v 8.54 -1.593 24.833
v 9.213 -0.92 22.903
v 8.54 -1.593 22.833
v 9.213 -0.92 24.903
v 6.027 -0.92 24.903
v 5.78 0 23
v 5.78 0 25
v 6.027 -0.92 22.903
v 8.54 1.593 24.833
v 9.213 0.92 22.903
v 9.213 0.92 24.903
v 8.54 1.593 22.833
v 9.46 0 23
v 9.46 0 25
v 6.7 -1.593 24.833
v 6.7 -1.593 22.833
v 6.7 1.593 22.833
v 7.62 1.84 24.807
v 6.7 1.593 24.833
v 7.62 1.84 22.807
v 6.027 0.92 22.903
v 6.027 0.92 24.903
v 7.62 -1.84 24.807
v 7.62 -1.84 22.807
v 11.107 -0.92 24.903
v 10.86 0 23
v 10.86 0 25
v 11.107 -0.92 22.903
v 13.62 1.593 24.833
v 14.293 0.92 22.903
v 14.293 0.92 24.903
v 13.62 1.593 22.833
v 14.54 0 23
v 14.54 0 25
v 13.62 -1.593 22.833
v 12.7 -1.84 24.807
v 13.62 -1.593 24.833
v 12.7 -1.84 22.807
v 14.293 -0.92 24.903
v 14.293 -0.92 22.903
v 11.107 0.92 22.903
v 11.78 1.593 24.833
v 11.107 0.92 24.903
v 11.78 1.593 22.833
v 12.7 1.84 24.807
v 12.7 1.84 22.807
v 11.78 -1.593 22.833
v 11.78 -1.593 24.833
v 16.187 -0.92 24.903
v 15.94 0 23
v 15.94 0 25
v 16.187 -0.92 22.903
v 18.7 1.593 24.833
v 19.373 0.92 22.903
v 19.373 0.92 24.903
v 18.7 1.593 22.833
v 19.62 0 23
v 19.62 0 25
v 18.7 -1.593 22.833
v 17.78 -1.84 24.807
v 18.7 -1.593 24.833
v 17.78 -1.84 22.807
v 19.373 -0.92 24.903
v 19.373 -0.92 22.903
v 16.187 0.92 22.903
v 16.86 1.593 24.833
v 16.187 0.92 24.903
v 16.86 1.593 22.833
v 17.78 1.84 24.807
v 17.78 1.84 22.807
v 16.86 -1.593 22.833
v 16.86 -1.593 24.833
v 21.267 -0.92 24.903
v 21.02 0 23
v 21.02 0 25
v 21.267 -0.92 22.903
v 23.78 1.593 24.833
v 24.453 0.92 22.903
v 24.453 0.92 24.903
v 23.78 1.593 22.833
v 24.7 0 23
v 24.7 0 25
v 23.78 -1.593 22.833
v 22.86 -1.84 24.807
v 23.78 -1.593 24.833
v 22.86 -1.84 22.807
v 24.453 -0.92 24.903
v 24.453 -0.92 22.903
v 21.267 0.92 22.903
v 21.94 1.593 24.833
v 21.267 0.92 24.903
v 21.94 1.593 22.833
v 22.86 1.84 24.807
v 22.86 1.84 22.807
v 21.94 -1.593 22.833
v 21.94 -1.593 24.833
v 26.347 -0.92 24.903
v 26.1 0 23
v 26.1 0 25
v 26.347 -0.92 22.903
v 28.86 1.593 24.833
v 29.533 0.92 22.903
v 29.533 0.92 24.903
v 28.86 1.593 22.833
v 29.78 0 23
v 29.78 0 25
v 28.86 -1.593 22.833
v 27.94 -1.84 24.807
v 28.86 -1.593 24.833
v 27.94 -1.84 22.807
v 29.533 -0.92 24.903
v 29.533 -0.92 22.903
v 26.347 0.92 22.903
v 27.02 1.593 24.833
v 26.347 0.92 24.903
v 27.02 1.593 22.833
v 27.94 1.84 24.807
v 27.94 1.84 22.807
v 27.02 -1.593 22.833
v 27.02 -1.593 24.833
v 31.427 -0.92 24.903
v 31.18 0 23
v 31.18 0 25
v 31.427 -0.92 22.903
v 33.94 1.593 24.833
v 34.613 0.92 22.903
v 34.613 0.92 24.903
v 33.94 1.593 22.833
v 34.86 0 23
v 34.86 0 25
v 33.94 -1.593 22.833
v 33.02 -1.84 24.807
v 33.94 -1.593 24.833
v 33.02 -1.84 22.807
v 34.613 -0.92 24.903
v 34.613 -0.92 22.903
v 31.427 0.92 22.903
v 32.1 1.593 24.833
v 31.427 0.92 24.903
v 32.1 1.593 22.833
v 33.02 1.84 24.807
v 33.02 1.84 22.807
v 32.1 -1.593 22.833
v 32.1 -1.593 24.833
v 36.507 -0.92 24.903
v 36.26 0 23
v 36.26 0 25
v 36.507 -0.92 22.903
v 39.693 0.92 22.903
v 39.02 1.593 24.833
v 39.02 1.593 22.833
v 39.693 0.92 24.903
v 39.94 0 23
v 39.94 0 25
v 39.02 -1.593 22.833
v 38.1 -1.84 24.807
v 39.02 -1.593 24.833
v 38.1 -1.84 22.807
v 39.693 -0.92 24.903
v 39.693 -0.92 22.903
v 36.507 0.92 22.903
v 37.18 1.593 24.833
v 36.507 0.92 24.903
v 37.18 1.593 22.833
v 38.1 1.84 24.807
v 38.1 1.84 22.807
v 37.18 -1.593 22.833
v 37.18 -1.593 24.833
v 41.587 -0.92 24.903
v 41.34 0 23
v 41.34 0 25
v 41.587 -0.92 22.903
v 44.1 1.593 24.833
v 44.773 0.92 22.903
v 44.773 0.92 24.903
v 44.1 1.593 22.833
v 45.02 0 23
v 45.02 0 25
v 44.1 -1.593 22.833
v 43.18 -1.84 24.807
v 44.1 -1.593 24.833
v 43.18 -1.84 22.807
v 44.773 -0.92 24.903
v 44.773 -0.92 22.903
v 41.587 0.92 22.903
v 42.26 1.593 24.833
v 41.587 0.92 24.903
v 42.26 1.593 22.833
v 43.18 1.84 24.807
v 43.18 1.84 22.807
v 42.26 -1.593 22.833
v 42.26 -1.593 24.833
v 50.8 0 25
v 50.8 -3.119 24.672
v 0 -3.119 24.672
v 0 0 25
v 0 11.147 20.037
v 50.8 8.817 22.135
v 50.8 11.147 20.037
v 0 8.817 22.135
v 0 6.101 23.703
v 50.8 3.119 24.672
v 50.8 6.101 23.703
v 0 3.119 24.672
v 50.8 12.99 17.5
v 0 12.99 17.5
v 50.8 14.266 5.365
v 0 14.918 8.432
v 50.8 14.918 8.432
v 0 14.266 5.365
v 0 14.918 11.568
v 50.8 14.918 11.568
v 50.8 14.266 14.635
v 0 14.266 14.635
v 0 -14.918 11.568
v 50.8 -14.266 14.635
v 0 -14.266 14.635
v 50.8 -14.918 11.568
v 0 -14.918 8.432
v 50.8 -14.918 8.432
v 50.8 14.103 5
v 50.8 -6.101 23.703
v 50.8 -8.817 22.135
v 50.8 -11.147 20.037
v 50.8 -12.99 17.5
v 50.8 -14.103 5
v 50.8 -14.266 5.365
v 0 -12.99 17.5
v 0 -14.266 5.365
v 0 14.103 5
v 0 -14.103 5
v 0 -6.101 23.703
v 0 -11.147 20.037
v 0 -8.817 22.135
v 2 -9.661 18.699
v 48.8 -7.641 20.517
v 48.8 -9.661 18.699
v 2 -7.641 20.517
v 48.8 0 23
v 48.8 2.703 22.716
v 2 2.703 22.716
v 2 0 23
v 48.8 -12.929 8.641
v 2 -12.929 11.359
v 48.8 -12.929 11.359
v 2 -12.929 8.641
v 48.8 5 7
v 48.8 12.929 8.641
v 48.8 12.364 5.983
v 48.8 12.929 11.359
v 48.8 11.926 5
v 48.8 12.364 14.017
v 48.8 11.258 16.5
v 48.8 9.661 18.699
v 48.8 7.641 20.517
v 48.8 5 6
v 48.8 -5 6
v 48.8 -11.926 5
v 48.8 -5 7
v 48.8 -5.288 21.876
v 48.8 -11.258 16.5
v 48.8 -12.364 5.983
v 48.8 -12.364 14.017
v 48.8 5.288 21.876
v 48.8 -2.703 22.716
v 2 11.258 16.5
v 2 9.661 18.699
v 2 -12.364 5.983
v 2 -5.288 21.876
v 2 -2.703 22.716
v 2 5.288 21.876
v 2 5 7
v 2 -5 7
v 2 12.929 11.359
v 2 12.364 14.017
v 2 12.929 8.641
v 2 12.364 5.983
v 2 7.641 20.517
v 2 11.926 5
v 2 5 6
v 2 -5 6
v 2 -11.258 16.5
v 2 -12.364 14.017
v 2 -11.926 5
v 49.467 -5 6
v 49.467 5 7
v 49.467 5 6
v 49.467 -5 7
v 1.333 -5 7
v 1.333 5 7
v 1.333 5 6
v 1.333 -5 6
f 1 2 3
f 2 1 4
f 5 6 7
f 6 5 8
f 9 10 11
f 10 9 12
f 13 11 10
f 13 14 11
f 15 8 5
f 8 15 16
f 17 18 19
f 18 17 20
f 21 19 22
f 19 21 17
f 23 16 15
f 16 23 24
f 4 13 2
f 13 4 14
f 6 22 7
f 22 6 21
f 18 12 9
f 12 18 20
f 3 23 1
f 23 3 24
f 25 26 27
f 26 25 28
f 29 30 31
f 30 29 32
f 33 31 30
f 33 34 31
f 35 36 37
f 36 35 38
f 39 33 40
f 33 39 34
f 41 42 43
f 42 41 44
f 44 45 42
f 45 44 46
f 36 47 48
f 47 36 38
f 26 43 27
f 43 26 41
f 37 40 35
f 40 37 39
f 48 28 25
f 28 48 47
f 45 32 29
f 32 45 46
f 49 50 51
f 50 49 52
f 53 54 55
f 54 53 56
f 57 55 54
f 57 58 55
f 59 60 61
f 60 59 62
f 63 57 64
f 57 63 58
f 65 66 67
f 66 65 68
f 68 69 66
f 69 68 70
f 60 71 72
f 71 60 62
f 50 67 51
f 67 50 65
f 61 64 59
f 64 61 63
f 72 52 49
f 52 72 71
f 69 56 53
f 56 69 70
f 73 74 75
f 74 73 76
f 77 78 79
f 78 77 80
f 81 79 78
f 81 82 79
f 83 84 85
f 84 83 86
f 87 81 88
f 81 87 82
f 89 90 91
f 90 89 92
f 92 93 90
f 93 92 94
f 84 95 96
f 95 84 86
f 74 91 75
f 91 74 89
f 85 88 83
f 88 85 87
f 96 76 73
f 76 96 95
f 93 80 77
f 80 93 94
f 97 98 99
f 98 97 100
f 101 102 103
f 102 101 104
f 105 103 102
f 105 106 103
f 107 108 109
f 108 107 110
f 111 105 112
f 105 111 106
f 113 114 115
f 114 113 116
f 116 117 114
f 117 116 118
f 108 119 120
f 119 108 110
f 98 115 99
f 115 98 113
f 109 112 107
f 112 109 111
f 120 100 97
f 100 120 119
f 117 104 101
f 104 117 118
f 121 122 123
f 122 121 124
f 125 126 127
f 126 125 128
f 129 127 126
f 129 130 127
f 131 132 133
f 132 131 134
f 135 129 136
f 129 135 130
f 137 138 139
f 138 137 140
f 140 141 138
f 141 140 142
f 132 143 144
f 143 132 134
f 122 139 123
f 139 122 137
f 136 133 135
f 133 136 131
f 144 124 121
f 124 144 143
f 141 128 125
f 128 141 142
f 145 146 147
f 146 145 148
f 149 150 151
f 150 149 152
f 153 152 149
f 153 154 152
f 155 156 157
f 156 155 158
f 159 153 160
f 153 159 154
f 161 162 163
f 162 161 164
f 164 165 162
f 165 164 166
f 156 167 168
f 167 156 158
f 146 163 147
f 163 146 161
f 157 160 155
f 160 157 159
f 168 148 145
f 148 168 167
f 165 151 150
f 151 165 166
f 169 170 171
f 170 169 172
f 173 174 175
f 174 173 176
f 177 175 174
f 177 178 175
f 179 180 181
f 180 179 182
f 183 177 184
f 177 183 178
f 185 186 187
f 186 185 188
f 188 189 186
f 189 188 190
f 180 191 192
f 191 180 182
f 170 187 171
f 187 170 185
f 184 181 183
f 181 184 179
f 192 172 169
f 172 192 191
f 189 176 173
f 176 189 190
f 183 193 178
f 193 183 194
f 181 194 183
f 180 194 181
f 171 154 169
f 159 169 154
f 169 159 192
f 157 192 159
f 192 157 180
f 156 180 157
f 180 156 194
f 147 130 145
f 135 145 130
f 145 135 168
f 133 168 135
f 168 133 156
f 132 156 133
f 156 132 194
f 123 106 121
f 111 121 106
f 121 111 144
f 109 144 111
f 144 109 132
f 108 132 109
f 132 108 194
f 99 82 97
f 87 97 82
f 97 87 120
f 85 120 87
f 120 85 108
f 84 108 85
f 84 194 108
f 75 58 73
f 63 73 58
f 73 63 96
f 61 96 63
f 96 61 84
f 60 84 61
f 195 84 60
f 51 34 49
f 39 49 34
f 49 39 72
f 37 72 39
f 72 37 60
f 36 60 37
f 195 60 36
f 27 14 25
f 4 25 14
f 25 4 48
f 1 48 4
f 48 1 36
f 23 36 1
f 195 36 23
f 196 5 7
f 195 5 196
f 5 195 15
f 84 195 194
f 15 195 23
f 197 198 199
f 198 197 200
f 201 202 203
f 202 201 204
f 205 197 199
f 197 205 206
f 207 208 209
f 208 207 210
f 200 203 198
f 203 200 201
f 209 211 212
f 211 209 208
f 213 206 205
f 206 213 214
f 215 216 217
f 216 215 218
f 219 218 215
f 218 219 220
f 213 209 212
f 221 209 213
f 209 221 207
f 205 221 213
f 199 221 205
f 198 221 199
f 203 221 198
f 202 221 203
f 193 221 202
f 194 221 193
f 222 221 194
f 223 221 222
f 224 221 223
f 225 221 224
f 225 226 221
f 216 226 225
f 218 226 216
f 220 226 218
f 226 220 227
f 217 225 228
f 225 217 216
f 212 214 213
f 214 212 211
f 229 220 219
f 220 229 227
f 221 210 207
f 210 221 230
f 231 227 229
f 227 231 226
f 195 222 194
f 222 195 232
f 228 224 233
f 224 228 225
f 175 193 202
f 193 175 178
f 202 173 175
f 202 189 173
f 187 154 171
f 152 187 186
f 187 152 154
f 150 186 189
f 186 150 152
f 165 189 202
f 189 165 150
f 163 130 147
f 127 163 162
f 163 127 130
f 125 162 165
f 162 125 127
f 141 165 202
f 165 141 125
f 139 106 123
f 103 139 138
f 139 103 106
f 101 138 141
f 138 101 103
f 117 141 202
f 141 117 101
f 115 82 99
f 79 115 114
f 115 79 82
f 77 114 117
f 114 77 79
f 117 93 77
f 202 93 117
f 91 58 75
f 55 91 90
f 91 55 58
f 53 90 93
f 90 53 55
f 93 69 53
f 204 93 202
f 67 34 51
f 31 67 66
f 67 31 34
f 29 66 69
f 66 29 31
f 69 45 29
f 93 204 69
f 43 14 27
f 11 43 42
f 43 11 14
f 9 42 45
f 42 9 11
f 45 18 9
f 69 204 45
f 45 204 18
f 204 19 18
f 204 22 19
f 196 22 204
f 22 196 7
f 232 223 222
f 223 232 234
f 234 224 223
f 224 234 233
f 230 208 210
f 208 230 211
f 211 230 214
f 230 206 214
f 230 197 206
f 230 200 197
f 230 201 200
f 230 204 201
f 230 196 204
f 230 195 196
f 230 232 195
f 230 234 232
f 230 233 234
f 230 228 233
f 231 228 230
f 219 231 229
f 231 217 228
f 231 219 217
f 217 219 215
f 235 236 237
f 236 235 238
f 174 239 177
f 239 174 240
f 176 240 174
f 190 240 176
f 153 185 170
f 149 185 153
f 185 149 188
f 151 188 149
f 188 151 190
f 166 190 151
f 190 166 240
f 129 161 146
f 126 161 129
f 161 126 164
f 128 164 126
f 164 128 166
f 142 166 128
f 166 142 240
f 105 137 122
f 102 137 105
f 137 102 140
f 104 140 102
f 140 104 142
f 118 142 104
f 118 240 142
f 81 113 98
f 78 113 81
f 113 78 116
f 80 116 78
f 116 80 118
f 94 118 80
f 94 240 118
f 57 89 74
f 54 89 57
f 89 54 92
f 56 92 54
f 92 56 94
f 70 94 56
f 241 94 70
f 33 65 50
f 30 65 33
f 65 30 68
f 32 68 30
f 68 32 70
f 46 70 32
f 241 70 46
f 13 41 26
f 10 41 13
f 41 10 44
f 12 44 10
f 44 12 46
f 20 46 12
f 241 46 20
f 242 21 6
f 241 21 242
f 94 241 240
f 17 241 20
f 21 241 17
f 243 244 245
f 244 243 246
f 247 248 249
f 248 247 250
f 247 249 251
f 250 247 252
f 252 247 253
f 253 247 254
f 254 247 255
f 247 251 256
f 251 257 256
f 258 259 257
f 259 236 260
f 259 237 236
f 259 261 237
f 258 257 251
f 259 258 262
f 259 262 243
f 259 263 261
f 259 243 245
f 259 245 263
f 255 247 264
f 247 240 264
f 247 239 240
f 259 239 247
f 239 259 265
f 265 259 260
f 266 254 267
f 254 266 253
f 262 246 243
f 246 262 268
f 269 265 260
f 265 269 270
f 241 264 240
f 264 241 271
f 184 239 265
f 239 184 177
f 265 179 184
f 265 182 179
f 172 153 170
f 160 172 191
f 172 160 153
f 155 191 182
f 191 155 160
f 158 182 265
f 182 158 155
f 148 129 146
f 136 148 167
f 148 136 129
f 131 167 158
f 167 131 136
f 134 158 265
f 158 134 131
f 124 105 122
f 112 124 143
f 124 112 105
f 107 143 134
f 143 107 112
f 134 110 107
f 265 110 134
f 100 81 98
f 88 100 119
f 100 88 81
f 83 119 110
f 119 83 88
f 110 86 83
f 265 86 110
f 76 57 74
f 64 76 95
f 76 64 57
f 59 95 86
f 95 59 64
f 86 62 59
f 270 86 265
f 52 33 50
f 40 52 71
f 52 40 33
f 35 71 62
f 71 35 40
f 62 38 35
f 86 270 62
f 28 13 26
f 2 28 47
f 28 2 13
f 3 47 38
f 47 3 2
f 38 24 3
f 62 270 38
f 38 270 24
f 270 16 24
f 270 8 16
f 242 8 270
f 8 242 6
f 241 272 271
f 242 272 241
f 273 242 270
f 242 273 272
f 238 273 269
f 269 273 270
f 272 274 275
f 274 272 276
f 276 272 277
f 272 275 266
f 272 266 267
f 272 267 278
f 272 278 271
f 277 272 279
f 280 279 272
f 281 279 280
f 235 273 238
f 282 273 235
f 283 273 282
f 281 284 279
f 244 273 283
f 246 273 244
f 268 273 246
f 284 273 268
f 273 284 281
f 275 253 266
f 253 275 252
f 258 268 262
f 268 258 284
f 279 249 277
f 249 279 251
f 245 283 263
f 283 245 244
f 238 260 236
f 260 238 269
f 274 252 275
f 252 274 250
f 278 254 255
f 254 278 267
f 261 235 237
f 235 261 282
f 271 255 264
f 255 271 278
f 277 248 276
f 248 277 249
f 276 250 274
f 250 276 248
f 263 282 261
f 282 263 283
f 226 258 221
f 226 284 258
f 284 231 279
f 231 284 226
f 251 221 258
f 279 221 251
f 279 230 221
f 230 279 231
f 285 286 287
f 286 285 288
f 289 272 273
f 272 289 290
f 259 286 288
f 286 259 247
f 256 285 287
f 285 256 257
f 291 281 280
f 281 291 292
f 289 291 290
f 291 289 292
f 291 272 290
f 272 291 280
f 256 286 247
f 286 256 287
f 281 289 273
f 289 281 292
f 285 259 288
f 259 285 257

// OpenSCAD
// file: params.scad
hob_radius = 1.84;
hob_spacing = 5.08;

hobs_wide = 8;
hobs_deep = 1;

case_width = 30;
case_length = (hobs_wide+2)*hob_spacing;
case_thick = 2;
case_slice = case_width / 3;

arm_depth = 10;
// main file
/*
    Housing for leds and controller
*/

include <params.scad>

module led_matrix(wide,deep) {
    height = 5;

    union() {
        for (i = [1 : wide]) {
            for (j = [1 : deep]) {
                translate([i*hob_spacing, j*hob_spacing, 0])
                cylinder(r1 = hob_radius,r2 = hob_radius,$fn = 12,h = height, center=false);
            }
        }

    };
};

difference() {
    translate([0,0,case_width/3])
    rotate([0,90,0])
        cylinder(h=case_length, r = case_width/2);
    translate([case_thick,0,case_width/3])
    rotate([0,90,0])
        cylinder(h=case_length-case_thick*2, r = case_width/2 - case_thick);
    translate([-0.5, -case_width/2, -case_width/2 + case_width/3])
        cube([case_length+1, case_width, case_slice]);
    translate([hob_spacing/2,-((hobs_deep+1)*hob_spacing)/2,case_width/2 + case_width/3 - case_thick - 1])
        led_matrix(hobs_wide,hobs_deep);
    translate([case_thick/3 * 2, -5, -case_width/2 + case_width/3 + case_slice + 1])
        cube([case_length - case_thick*2 + case_thick/3 * 2,arm_depth,1]);
};
